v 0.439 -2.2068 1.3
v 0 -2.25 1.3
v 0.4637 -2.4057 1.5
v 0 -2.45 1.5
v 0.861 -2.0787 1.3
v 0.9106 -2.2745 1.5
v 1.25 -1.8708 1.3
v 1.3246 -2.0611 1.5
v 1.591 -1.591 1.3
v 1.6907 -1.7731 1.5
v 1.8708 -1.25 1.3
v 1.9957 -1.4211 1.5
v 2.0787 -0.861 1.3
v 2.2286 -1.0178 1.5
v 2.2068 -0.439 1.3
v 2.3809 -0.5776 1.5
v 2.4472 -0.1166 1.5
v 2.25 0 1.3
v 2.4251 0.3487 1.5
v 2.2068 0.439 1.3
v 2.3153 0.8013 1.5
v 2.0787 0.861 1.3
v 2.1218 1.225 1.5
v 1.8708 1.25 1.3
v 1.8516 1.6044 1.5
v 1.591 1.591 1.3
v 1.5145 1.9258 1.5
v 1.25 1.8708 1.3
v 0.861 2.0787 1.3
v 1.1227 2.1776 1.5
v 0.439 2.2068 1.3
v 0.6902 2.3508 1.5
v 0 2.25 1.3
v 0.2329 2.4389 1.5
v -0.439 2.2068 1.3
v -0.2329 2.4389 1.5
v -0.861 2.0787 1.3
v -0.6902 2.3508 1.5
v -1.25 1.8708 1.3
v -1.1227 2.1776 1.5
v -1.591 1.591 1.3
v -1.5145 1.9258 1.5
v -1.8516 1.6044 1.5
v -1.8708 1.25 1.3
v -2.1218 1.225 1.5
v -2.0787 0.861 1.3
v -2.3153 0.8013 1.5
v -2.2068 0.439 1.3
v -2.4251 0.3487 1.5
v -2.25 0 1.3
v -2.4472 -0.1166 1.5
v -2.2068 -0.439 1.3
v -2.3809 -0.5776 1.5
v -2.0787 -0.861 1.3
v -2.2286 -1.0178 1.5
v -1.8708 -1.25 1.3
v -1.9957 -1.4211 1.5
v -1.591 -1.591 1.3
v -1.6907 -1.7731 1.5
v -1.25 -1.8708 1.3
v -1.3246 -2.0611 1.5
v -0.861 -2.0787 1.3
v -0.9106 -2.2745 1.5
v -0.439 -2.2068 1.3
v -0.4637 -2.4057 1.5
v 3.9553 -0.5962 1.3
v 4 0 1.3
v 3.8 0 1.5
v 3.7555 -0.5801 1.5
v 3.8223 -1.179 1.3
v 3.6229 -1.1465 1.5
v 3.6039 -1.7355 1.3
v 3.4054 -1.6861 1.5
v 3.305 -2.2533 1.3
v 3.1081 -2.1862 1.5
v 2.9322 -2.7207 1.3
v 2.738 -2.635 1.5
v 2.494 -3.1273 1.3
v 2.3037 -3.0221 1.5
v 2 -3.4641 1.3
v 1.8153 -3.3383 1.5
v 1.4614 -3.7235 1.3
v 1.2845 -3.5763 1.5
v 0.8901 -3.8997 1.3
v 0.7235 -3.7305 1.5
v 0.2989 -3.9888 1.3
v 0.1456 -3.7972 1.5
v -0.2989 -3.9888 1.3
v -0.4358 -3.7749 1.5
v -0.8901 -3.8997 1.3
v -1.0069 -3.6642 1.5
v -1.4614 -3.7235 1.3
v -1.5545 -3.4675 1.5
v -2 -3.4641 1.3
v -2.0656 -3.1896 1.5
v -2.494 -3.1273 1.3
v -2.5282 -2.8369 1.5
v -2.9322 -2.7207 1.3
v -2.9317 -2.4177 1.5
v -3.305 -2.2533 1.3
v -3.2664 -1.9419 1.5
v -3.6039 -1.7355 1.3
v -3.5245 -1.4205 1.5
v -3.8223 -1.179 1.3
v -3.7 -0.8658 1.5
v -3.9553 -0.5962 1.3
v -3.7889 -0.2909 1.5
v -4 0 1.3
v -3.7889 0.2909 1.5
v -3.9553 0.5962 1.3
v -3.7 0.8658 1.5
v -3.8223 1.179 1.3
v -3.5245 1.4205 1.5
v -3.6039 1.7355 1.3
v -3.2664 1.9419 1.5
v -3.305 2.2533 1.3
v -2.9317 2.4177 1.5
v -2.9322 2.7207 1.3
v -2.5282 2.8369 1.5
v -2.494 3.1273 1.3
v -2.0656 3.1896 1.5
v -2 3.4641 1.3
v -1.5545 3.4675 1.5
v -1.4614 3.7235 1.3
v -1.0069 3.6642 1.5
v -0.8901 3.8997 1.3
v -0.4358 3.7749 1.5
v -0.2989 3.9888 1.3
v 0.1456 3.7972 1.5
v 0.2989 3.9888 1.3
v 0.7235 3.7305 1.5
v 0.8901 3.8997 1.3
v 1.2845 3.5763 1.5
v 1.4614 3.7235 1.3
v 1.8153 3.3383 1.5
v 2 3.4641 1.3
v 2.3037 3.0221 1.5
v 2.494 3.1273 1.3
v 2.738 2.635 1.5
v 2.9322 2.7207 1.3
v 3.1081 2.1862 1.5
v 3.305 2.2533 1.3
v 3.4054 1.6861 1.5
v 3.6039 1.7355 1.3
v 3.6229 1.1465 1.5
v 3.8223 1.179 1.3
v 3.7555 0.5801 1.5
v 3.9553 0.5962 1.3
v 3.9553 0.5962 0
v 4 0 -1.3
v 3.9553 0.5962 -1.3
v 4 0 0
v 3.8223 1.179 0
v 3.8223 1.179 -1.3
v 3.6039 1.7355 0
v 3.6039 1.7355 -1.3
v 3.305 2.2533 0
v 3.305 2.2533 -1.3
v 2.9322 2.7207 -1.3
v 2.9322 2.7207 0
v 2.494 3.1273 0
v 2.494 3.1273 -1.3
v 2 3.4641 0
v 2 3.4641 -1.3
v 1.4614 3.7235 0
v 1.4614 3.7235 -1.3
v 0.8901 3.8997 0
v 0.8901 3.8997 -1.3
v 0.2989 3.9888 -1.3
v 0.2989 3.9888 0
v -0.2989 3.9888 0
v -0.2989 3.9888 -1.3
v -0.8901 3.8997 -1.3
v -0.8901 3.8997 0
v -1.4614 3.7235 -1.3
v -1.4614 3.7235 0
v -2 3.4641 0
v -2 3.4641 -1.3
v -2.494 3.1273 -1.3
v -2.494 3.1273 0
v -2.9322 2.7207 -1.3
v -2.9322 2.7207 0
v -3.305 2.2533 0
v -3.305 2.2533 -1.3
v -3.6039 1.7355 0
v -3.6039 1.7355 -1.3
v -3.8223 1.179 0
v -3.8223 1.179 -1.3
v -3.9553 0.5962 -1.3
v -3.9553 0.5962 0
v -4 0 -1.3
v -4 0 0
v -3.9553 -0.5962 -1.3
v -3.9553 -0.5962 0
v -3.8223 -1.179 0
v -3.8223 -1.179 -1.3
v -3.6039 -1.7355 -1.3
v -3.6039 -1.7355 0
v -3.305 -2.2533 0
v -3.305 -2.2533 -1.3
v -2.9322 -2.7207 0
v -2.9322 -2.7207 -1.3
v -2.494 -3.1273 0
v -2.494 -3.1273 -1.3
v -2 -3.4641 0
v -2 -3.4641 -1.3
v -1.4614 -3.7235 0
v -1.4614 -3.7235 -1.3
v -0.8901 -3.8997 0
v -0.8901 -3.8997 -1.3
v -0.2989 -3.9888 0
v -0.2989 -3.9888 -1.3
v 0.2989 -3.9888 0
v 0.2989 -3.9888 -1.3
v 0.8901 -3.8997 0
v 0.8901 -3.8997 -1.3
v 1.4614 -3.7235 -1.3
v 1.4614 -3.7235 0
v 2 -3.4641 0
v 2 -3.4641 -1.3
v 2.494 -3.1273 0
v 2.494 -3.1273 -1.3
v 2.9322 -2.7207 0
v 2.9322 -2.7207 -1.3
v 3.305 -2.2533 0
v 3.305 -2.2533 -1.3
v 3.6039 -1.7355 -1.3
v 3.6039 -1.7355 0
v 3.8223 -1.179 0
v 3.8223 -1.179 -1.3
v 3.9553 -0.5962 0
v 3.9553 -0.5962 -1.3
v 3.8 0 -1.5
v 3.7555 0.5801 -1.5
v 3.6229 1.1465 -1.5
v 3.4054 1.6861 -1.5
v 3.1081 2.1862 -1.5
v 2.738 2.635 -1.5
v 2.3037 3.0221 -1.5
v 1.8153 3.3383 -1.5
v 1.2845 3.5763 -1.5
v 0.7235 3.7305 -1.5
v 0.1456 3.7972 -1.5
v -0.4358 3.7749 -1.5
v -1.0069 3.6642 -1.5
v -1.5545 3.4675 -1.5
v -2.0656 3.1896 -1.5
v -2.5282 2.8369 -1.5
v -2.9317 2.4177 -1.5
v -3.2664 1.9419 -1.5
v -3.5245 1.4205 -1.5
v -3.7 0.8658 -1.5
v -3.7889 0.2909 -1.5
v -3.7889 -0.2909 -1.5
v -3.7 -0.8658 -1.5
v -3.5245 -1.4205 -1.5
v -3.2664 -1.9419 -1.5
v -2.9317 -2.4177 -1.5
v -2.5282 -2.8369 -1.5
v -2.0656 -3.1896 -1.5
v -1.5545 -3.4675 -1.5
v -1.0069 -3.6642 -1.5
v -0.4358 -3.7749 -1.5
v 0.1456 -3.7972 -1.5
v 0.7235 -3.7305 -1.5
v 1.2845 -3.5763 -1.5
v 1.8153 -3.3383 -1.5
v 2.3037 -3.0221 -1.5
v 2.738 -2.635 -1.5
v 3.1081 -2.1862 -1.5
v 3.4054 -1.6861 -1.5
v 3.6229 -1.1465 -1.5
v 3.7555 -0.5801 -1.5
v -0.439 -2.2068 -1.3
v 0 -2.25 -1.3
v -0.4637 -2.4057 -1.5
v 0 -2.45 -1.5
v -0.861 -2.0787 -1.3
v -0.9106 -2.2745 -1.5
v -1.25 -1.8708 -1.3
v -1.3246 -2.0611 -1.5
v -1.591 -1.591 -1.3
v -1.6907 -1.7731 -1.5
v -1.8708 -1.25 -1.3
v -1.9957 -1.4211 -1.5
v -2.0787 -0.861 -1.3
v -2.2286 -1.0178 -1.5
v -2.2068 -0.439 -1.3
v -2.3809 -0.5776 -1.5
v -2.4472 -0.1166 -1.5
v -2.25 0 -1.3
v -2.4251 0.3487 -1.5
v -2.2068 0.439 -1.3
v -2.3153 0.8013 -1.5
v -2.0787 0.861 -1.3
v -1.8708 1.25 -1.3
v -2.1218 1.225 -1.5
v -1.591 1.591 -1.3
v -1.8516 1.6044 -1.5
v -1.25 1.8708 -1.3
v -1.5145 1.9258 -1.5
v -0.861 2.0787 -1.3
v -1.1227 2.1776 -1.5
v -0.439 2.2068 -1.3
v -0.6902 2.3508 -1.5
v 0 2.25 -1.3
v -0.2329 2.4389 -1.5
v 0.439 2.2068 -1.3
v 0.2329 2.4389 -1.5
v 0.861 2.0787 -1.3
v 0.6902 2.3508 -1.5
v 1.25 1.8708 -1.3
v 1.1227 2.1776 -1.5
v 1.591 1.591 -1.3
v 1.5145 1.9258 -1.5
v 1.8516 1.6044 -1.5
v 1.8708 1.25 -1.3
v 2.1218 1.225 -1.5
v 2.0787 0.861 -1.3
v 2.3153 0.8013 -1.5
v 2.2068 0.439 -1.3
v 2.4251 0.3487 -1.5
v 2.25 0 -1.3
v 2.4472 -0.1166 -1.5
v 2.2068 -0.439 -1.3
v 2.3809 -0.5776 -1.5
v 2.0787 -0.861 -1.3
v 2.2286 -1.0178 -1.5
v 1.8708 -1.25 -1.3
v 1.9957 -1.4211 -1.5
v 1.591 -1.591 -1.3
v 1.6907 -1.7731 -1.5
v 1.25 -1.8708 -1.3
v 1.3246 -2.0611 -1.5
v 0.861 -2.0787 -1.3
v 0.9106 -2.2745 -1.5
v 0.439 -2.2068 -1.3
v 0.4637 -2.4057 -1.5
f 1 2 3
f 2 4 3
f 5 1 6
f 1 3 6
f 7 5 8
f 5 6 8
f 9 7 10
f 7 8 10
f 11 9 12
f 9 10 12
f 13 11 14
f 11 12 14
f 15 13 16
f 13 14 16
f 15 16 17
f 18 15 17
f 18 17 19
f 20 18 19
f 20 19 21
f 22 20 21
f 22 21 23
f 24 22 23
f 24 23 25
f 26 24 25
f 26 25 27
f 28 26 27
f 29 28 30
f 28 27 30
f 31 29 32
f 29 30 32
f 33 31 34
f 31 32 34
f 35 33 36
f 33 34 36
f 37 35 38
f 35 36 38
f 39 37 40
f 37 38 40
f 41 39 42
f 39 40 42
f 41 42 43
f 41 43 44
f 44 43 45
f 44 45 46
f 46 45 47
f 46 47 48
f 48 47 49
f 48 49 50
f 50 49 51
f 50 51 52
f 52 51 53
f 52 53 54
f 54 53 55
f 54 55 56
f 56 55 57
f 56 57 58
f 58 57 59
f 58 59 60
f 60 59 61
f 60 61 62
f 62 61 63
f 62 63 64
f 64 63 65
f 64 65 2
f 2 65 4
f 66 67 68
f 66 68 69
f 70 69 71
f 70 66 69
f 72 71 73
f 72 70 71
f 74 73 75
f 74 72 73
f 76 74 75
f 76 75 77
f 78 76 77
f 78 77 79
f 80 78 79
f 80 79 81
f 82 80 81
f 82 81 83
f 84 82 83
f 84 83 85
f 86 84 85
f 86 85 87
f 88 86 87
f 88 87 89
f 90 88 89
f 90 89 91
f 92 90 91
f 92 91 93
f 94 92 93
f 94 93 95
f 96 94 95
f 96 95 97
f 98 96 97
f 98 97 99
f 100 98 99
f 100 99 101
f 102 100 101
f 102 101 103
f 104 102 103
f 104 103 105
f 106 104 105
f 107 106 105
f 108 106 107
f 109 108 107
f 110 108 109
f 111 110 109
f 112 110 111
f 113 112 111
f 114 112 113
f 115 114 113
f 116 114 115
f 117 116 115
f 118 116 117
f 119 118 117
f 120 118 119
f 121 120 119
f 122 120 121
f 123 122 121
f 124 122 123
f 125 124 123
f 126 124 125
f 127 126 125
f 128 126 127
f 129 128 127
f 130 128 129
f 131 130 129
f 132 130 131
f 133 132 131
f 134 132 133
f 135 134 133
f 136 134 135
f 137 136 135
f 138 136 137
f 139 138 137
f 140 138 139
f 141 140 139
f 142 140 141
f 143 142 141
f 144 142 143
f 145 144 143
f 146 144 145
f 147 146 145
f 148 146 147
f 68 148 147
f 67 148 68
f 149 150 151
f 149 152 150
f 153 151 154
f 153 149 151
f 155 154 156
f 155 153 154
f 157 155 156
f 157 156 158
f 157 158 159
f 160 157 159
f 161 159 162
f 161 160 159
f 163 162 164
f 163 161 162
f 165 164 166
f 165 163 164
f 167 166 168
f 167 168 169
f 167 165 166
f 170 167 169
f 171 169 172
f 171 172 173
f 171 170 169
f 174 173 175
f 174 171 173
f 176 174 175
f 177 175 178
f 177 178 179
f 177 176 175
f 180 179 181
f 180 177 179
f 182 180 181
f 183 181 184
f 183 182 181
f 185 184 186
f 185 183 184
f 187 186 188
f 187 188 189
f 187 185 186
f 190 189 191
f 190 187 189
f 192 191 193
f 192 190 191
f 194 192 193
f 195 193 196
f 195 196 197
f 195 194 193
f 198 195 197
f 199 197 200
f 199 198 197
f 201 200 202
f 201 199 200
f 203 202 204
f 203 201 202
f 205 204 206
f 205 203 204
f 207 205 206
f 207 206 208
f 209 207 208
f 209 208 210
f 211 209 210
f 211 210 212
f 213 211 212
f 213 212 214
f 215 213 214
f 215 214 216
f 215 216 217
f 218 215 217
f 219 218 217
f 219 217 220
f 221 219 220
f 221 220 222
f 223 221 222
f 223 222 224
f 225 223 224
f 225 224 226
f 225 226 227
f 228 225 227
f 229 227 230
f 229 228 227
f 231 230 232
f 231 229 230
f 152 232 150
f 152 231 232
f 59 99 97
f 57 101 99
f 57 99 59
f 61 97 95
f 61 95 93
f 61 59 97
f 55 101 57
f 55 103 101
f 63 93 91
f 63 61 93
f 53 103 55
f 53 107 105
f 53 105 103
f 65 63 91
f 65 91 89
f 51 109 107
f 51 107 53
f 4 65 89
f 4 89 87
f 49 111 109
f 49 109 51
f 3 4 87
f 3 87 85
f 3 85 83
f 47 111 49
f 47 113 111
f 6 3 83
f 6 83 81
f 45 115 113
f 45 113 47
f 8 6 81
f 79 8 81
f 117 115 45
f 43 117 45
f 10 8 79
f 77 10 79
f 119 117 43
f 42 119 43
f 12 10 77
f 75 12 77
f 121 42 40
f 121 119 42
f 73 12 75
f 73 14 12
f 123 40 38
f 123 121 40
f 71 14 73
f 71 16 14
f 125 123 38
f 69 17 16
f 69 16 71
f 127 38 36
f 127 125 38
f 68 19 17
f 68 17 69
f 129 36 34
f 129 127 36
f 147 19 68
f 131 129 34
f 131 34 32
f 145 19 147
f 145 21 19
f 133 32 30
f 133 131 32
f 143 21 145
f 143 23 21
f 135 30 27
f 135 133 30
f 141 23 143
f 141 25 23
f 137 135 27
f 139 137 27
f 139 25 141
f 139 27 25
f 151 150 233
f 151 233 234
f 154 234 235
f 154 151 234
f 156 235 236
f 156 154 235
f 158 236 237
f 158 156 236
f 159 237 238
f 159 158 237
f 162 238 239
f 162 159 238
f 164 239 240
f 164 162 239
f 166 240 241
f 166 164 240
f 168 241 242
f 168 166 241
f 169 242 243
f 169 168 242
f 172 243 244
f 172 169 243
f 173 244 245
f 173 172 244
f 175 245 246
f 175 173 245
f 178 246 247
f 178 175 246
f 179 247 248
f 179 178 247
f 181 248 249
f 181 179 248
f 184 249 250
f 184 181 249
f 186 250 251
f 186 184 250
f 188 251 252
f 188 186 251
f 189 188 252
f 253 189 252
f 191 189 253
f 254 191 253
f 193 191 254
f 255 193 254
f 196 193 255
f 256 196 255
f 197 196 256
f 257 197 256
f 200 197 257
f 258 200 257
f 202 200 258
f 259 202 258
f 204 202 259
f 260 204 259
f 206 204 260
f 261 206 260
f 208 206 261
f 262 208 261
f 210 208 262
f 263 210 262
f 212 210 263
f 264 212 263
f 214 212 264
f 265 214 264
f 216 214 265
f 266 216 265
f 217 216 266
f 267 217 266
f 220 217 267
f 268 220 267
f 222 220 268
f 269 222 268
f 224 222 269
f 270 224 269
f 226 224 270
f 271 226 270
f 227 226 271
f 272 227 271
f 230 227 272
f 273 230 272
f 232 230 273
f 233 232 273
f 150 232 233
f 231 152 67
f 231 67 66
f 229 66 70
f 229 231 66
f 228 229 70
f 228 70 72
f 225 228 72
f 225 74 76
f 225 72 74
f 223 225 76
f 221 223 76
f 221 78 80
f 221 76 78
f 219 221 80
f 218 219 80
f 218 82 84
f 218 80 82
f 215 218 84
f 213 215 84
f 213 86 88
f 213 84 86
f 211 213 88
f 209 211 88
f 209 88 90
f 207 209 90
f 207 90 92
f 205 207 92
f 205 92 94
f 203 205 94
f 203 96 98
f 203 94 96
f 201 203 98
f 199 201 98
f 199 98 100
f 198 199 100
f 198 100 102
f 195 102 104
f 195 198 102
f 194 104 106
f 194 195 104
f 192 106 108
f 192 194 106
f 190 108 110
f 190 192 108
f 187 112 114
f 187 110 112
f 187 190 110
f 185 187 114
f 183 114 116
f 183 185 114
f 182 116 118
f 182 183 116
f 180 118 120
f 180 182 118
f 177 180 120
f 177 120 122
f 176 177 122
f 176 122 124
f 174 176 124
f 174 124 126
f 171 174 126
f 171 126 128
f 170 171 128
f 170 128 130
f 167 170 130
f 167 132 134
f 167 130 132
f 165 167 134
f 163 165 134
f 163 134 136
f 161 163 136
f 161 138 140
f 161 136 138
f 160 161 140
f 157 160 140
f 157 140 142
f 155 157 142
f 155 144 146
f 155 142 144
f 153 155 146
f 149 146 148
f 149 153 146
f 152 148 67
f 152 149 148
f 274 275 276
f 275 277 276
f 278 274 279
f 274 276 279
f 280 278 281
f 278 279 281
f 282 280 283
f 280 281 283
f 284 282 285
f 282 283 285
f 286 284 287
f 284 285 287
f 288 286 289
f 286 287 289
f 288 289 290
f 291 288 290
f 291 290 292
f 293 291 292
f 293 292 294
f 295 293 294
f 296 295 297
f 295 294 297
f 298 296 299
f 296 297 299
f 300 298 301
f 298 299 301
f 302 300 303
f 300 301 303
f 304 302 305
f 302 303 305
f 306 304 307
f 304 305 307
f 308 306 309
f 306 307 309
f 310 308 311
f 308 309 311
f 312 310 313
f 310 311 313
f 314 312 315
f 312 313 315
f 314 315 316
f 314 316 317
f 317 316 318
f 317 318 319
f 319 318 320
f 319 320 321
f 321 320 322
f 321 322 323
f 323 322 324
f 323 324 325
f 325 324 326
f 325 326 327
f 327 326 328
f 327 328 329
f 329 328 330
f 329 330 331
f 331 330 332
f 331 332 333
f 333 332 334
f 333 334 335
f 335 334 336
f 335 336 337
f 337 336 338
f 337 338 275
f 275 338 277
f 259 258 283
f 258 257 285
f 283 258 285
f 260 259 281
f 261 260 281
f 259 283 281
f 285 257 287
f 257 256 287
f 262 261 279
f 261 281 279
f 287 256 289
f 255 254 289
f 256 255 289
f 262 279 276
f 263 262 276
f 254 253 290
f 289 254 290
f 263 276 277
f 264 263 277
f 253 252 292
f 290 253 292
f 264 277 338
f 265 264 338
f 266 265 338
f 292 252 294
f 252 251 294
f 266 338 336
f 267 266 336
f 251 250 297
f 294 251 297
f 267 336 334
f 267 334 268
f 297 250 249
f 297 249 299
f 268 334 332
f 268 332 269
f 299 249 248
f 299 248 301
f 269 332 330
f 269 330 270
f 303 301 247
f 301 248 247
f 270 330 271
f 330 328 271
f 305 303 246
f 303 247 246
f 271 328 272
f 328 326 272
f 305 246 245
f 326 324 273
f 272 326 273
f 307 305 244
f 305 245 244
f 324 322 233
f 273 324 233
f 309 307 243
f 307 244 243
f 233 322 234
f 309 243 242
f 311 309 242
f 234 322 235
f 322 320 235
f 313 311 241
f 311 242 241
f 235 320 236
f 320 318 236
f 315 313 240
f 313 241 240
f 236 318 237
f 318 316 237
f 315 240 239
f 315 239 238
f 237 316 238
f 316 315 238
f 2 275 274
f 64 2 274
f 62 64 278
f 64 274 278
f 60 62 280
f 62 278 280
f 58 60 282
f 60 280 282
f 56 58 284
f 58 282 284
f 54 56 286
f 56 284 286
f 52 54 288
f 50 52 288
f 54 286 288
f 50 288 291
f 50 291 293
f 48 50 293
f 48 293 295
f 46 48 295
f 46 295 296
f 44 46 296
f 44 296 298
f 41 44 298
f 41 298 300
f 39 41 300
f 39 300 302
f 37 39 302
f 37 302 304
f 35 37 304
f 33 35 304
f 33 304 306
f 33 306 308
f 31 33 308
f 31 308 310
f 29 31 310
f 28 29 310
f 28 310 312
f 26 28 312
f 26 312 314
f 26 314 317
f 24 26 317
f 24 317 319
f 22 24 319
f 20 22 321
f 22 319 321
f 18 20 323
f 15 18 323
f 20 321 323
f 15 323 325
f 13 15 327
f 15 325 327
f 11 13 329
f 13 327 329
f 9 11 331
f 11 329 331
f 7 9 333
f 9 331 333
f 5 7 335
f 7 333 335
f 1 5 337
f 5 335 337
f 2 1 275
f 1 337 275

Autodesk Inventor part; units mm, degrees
ref_plane "YZ Plane" through (0, 0, 0) normal (1, 0, 0) x (0, 1, 0)
ref_plane "XZ Plane" through (0, 0, 0) normal (0, 1, 0) x (-1, 0, 0)
ref_plane "XY Plane" through (0, 0, 0) normal (0, 0, 1) x (1, 0, 0)
sketch "スケッチ1" plane through (0, 0, 0) normal (0, 0, 1) x (1, 0, 0)
  circle A0 centre (0, 0) radius 4
  dimension "d13" = 8
extrude "押し出し1" add sketch "スケッチ1" along normal mid plane 3
sketch "スケッチ2" plane through (0, 0, 1.5) normal (0, 0, 1) x (1, 0, 0)
  point P0 (0, 0)
  point P1 (0, 0)
hole "穴1" at (0, 0, 1.5) direction (0, 0, -1) diameter 4.5 end through all clearance for "Flat Head Machine Screw" size "M4" standard "Ansi Metric M Profile"
mirror "ミラー1" about plane through (0, 0, 0) normal (0, 0, 1) of "穴1"
chamfer "面取り1" distance 0.2 angle 45 4 edges at (0, 2.25, 1.5) (-4, 0, 1.5) (-4, 0, -1.5) (0, 2.25, -1.5)
properties part number "unir-spacer6" material "鋼、炭素鋼"
